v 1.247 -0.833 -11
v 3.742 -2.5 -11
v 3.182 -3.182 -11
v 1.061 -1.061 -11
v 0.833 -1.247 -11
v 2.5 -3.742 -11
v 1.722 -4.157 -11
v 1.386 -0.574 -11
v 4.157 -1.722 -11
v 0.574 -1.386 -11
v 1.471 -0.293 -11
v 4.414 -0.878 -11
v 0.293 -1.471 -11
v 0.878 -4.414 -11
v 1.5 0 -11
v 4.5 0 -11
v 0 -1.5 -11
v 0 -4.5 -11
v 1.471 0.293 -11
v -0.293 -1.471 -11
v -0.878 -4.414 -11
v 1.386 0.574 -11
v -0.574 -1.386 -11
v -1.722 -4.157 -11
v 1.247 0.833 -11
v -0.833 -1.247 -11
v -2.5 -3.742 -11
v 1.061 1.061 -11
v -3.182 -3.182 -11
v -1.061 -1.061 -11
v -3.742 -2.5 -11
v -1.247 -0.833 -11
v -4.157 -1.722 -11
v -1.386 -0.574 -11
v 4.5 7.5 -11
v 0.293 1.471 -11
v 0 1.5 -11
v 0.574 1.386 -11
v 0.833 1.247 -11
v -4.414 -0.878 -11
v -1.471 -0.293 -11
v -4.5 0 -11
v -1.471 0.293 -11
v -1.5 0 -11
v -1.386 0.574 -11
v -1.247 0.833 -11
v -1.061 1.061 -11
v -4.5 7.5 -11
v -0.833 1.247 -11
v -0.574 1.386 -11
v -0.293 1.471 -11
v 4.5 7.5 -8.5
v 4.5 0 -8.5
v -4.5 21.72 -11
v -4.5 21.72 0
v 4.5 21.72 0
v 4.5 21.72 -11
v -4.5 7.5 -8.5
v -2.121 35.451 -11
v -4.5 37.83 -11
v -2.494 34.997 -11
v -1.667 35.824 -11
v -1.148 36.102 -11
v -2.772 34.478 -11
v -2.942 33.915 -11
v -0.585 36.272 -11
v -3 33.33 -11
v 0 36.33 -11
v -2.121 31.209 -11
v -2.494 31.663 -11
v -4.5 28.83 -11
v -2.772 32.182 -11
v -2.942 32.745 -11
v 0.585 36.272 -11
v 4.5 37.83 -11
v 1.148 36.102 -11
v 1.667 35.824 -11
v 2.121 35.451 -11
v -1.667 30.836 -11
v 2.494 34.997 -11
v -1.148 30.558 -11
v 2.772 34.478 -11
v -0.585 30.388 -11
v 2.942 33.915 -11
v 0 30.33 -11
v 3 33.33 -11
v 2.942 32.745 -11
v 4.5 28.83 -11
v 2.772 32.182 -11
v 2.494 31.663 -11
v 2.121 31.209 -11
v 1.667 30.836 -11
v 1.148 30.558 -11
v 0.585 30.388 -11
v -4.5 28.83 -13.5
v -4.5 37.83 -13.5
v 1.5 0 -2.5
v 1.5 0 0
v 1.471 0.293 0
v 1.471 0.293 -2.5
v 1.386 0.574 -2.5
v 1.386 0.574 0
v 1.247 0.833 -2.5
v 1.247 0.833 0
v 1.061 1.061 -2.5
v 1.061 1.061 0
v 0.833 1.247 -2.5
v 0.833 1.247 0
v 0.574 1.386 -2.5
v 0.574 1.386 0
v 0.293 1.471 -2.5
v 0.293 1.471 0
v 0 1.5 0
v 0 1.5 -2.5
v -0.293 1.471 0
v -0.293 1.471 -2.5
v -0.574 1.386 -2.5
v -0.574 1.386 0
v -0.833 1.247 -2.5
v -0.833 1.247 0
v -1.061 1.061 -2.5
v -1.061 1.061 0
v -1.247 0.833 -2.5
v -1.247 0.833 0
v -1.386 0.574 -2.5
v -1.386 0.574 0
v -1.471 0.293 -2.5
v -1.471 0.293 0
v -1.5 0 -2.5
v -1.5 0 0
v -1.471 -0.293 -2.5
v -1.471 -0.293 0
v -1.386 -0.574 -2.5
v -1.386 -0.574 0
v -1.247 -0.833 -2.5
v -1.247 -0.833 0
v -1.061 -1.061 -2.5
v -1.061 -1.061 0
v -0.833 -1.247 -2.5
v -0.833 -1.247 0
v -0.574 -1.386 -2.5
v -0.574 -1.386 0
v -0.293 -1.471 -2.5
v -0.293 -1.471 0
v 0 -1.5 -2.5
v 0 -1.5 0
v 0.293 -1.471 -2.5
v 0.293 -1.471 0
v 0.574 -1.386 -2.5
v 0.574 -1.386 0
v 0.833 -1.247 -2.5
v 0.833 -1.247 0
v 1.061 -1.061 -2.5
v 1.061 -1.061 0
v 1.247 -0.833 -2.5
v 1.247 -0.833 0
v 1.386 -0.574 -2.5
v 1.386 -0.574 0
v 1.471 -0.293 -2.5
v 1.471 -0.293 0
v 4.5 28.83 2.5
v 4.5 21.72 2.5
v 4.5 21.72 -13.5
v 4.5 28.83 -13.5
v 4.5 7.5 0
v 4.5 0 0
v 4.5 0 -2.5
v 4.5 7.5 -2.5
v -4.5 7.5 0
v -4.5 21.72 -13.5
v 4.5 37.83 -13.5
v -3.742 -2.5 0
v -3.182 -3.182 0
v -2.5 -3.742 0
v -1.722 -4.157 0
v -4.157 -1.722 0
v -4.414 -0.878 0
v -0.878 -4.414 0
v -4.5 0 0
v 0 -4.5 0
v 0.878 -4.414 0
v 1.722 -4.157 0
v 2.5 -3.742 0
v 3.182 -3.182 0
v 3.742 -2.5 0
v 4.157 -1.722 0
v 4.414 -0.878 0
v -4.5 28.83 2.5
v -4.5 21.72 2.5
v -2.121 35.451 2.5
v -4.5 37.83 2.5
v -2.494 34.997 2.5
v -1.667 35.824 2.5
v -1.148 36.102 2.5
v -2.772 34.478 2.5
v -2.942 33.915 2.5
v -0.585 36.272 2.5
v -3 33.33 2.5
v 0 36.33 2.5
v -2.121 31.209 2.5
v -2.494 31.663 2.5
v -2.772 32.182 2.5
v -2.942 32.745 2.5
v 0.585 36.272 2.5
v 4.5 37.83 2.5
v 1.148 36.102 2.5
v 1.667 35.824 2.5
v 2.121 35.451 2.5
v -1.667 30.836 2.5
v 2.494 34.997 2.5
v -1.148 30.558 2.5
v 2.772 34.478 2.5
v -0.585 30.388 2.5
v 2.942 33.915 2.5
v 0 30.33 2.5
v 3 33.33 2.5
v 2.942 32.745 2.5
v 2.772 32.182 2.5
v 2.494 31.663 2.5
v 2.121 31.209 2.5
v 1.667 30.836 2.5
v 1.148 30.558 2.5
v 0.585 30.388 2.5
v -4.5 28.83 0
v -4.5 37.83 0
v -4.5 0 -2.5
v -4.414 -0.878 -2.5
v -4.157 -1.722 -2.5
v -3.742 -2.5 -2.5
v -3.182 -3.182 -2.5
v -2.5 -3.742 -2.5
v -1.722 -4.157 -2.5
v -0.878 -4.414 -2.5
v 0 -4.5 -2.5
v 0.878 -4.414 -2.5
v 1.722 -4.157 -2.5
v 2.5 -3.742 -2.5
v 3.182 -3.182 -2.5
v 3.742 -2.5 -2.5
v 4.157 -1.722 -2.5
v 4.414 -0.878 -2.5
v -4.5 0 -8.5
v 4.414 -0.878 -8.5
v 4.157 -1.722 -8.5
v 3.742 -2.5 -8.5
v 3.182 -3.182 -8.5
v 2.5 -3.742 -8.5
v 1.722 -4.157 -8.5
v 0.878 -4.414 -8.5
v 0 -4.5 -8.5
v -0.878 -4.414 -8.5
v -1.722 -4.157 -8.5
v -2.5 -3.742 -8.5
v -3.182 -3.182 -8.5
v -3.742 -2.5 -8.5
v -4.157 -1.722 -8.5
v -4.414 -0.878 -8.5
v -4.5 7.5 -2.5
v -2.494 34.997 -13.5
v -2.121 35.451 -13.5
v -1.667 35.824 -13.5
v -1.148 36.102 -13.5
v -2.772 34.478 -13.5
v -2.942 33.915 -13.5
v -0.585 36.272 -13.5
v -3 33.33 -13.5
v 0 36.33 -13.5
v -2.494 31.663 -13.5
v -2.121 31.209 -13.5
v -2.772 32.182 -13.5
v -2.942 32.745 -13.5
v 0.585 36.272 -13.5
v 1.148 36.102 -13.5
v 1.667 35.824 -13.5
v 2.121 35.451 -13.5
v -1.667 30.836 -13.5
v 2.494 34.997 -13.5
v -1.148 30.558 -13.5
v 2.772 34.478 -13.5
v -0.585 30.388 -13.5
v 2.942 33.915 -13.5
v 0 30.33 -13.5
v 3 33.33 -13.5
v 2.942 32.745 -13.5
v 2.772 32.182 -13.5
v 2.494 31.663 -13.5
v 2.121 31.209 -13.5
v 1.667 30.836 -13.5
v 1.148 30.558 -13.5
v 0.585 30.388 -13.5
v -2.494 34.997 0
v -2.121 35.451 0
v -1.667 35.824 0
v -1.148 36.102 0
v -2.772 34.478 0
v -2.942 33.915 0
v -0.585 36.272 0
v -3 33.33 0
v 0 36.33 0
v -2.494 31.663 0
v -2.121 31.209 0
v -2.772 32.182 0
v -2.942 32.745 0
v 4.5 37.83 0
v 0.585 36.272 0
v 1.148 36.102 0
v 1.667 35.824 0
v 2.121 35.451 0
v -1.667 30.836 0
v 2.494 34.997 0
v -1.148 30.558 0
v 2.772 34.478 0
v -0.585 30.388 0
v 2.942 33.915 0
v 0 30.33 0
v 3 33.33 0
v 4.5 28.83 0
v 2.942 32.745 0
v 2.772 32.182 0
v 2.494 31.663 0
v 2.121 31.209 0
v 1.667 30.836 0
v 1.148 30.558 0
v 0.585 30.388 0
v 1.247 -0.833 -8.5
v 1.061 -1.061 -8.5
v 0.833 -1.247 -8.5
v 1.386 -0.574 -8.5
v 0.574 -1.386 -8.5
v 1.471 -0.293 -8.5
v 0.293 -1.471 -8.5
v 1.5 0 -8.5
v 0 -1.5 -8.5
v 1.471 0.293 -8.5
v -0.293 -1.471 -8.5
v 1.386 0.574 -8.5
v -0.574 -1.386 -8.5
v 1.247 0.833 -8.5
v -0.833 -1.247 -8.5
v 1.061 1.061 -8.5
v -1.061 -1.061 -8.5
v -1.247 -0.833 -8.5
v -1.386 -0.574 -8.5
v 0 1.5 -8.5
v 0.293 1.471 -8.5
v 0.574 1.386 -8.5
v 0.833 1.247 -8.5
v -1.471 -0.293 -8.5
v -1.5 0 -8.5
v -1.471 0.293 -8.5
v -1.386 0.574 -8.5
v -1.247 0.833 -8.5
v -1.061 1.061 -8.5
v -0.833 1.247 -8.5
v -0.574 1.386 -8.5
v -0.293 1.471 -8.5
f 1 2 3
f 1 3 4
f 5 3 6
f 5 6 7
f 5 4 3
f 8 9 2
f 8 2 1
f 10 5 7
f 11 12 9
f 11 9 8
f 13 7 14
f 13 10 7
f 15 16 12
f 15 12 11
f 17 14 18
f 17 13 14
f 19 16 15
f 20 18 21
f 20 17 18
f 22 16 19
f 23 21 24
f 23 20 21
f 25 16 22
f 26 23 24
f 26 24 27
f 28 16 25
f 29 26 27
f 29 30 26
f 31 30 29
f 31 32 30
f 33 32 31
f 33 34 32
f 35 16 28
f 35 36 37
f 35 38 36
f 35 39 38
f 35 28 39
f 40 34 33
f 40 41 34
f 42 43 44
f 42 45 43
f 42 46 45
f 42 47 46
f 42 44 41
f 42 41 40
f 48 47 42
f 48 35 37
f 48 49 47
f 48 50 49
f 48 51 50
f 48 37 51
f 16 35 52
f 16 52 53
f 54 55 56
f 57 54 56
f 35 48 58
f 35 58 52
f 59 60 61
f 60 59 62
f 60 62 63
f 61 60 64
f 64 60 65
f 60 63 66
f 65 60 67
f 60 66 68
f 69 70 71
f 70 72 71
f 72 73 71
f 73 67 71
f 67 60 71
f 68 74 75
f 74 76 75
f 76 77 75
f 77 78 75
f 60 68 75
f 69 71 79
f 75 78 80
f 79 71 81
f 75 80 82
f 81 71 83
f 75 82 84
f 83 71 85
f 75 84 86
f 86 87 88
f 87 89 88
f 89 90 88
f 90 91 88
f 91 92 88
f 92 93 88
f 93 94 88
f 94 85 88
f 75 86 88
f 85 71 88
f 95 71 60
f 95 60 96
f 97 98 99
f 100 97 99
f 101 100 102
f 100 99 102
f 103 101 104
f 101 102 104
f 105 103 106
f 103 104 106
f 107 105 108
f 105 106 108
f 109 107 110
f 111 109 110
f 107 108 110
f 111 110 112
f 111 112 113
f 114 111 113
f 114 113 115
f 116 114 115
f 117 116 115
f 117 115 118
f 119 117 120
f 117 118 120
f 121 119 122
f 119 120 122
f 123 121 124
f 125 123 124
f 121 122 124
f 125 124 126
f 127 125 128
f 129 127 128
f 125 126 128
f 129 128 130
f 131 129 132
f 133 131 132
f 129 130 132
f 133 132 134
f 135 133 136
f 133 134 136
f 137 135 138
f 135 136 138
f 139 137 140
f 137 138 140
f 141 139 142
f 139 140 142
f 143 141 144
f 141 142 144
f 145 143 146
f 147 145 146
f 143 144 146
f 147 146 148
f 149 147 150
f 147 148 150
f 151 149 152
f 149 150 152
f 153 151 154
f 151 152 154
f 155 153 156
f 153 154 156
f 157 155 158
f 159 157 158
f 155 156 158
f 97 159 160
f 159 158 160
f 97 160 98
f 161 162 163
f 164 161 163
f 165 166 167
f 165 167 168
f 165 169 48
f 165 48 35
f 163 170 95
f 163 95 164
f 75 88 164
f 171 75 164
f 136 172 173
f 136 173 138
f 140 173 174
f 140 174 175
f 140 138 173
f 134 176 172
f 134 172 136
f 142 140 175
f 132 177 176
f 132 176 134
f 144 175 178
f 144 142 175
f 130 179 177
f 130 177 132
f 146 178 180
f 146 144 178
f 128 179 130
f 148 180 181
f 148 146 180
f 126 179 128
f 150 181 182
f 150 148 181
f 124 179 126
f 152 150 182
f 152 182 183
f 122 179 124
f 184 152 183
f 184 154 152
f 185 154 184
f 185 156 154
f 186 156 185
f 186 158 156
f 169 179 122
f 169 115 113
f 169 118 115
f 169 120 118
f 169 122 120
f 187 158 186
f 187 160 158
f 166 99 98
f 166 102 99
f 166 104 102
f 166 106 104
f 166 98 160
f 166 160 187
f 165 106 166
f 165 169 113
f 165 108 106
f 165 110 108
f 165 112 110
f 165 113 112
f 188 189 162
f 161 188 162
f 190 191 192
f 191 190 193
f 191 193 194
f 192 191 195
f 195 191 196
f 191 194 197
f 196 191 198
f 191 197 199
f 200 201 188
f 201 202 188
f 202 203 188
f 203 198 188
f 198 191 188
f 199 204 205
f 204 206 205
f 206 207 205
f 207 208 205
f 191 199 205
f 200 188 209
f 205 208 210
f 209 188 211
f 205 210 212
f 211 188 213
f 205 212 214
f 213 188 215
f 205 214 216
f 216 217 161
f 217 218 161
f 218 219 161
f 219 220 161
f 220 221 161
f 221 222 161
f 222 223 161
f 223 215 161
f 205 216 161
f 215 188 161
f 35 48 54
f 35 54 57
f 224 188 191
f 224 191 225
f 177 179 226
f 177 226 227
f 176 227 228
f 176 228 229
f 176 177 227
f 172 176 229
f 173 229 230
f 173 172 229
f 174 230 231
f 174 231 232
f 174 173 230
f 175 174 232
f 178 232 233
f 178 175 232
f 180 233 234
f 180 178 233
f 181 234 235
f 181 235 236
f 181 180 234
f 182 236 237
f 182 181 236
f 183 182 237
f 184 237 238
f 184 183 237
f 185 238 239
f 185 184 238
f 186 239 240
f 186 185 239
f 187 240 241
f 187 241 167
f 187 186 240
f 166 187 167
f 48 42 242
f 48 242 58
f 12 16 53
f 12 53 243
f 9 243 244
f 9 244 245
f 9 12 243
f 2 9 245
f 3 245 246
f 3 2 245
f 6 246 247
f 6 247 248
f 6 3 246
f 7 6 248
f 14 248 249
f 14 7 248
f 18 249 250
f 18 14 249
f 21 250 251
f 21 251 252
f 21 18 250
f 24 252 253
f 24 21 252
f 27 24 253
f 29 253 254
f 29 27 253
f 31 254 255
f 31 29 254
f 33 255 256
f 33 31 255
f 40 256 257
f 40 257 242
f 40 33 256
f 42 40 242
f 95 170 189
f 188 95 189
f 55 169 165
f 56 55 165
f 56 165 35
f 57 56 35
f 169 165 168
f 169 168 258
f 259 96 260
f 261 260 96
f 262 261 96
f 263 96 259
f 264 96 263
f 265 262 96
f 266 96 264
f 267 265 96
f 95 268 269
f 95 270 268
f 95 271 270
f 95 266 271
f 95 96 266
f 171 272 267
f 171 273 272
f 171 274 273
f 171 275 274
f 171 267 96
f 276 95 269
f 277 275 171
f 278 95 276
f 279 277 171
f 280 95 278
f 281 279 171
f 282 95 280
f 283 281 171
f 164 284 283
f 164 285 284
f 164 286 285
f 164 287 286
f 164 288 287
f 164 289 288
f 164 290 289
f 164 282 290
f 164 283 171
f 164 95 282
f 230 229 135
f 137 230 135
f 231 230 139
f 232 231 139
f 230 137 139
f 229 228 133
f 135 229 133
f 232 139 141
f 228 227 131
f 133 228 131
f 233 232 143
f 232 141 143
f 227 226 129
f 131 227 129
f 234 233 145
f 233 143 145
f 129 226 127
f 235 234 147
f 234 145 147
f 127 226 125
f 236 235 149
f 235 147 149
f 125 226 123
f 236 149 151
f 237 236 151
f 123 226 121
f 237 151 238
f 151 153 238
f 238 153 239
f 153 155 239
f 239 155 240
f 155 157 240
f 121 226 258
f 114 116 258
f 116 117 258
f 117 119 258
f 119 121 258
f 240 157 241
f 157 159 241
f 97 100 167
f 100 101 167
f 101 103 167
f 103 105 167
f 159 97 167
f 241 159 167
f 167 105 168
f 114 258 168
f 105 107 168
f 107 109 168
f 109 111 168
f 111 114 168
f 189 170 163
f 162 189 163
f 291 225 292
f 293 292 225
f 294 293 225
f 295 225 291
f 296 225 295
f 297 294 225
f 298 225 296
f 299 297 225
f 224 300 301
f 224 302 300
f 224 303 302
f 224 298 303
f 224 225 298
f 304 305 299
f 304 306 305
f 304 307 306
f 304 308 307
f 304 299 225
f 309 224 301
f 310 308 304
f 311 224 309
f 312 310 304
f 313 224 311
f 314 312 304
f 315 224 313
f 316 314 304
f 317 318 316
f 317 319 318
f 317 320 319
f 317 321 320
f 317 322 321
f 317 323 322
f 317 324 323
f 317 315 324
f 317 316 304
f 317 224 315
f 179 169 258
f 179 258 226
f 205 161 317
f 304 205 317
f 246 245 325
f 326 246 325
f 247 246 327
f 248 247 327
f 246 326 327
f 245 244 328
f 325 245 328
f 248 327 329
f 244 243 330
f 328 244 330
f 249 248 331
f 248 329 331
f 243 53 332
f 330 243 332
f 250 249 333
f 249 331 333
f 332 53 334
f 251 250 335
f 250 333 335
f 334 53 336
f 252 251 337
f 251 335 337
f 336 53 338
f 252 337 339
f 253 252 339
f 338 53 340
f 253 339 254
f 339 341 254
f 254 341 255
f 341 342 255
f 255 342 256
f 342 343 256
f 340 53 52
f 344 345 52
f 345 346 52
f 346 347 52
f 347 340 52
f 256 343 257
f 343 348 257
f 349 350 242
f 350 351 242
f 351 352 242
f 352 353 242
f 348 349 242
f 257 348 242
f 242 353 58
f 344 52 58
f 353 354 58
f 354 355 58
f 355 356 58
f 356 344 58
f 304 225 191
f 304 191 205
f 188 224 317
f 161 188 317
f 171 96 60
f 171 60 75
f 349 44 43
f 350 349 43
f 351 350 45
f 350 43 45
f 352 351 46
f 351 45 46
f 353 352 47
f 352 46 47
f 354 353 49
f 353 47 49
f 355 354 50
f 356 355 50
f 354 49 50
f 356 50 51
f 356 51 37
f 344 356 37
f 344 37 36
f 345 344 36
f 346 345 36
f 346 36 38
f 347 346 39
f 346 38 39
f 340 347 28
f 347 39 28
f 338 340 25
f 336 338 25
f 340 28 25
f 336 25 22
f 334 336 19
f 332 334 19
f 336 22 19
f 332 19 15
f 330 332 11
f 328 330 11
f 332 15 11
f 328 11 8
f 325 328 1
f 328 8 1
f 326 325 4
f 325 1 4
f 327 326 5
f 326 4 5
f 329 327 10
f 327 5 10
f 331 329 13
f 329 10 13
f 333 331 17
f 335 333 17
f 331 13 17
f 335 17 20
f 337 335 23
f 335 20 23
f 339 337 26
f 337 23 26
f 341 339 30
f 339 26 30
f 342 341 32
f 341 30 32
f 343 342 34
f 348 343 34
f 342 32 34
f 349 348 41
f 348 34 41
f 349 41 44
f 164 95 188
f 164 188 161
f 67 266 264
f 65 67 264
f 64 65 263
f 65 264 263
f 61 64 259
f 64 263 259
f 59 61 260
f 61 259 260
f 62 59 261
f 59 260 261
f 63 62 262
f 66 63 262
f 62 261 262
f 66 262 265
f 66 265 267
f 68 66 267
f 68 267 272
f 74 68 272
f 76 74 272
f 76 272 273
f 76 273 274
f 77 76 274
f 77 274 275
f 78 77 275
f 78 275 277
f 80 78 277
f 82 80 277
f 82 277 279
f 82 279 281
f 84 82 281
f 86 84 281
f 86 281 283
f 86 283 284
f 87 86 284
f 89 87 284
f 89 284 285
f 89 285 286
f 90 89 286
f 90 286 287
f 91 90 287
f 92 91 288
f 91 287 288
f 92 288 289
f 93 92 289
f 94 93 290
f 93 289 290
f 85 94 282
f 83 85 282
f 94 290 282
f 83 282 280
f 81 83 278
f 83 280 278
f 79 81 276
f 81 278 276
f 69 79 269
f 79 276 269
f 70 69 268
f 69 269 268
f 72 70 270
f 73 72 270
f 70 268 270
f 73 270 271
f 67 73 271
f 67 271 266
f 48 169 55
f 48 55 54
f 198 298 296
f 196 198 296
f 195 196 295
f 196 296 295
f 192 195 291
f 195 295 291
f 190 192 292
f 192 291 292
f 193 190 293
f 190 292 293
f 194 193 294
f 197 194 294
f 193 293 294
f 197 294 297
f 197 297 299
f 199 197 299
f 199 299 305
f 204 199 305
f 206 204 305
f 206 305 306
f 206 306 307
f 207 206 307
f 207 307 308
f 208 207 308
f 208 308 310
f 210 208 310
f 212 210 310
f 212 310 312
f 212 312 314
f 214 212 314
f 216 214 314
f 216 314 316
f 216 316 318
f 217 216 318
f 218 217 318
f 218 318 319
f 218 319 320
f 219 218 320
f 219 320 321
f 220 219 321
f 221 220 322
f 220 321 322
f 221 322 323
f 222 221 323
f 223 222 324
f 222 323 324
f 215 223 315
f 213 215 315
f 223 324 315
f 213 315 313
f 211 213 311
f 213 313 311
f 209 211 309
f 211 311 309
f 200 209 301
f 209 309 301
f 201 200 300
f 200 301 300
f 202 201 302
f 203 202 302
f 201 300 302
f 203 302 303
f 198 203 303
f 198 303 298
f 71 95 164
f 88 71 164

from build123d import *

# Parameters (mm, degrees)
SKETCH1_R             = 4.5
SKETCH1_R_2           = 1.5
BOSS_EXTRUDE1_DEPTH   = 2.5
SKETCH4_R             = 4.5
SKETCH4_R_2           = 1.5
BOSS_EXTRUDE2_DEPTH   = 2.5
SKETCH5_W             = 9
SKETCH5_H             = 11
BOSS_EXTRUDE3_DEPTH   = 14.22
SKETCH6_W             = 9
SKETCH6_H             = 2.5
SKETCH6_H_2           = 11
BOSS_EXTRUDE4_DEPTH   = 7.11
SKETCH7_W             = 9
SKETCH7_H             = 2.5
BOSS_EXTRUDE5_DEPTH   = 9
BOSS_EXTRUDE5_2_DEPTH = 9
SKETCH8_R             = 3
CUT_EXTRUDE1_DEPTH    = 16


with BuildPart() as part:
    # Sketch1 → Boss-Extrude1 (new body)
    # profile 1 of 2: a face of its own
    with BuildSketch(Plane.XY):
        Circle(SKETCH1_R)
        Circle(SKETCH1_R_2, mode=Mode.SUBTRACT)
    # profile 2 of 2: a face of its own
    with BuildSketch(Plane.XY):
        with BuildLine():
            Line((-4.5, 7.5), (-4.5, 0))
            ThreePointArc((-4.5, 0), (0, 4.5), (4.5, 0))
            Line((4.5, 0), (4.5, 7.5))
            Line((4.5, 7.5), (-4.5, 7.5))
        make_face()
    extrude(amount=-BOSS_EXTRUDE1_DEPTH)


with BuildPart() as body_2:
    # Sketch4 → Boss-Extrude2 (new body)
    # profile 1 of 2: a face of its own
    with BuildSketch(Plane(origin=(0, 0, -11), x_dir=(-1, 0, 0), z_dir=(0, 0, -1))):
        Circle(SKETCH4_R)
        Circle(SKETCH4_R_2, mode=Mode.SUBTRACT)
    # profile 2 of 2: a face of its own
    with BuildSketch(Plane(origin=(0, 0, -11), x_dir=(-1, 0, 0), z_dir=(0, 0, -1))):
        with BuildLine():
            Line((-4.5, 7.5), (-4.5, 0))
            ThreePointArc((-4.5, 0), (0, 4.5), (4.5, 0))
            Line((4.5, 0), (4.5, 7.5))
            Line((4.5, 7.5), (-4.5, 7.5))
        make_face()
    extrude(amount=-BOSS_EXTRUDE2_DEPTH)


with BuildPart() as body_3:
    # Sketch5 → Boss-Extrude3 (new body)
    with BuildSketch(Plane(origin=(0, 7.5, 0), x_dir=(1, 0, 0), z_dir=(0, 1, 0))):
        with Locations((0, 5.5)):
            Rectangle(SKETCH5_W, SKETCH5_H)
    extrude(amount=BOSS_EXTRUDE3_DEPTH)


with BuildPart() as body_4:
    # Sketch6 → Boss-Extrude4 (new body)
    with BuildSketch(Plane(origin=(0, 21.72, 0), x_dir=(1, 0, 0), z_dir=(0, 1, 0))):
        with Locations((0, 12.25)):
            Rectangle(SKETCH6_W, SKETCH6_H)
        with Locations((0, 5.5)):
            Rectangle(SKETCH6_W, SKETCH6_H_2)
        with Locations((0, -1.25)):
            Rectangle(SKETCH6_W, SKETCH6_H)
    extrude(amount=BOSS_EXTRUDE4_DEPTH)


with BuildPart() as body_5:
    # Sketch7 → Boss-Extrude5 (new body)
    with BuildSketch(Plane(origin=(0, 28.83, 0), x_dir=(1, 0, 0), z_dir=(0, 1, 0))):
        with Locations((0, 12.25)):
            Rectangle(SKETCH7_W, SKETCH7_H)
    extrude(amount=BOSS_EXTRUDE5_DEPTH)


with BuildPart() as body_6:
    # Sketch7 → Boss-Extrude5 2 (new body)
    with BuildSketch(Plane(origin=(0, 28.83, 0), x_dir=(1, 0, 0), z_dir=(0, 1, 0))):
        with Locations((0, -1.25)):
            Rectangle(SKETCH7_W, SKETCH7_H)
    extrude(amount=BOSS_EXTRUDE5_2_DEPTH)


with BuildPart() as cut_extrude1_tool:
    # Sketch8 → Cut-Extrude1 (new body)
    with BuildSketch(Plane(origin=(0, 0, -13.5), x_dir=(-1, 0, 0), z_dir=(0, 0, -1))):
        with Locations((0, 33.33)):
            Circle(SKETCH8_R)
    extrude(amount=-CUT_EXTRUDE1_DEPTH)


with BuildPart() as body_5_1:
    add(body_5.part)

    # Cut-Extrude1: cut by cut_extrude1_tool
    add(cut_extrude1_tool.part, mode=Mode.SUBTRACT)


with BuildPart() as body_6_1:
    add(body_6.part)

    # Cut-Extrude1: cut by cut_extrude1_tool
    add(cut_extrude1_tool.part, mode=Mode.SUBTRACT)


solid = Compound([part.part, body_2.part, body_3.part, body_4.part, body_5_1.part, body_6_1.part])
